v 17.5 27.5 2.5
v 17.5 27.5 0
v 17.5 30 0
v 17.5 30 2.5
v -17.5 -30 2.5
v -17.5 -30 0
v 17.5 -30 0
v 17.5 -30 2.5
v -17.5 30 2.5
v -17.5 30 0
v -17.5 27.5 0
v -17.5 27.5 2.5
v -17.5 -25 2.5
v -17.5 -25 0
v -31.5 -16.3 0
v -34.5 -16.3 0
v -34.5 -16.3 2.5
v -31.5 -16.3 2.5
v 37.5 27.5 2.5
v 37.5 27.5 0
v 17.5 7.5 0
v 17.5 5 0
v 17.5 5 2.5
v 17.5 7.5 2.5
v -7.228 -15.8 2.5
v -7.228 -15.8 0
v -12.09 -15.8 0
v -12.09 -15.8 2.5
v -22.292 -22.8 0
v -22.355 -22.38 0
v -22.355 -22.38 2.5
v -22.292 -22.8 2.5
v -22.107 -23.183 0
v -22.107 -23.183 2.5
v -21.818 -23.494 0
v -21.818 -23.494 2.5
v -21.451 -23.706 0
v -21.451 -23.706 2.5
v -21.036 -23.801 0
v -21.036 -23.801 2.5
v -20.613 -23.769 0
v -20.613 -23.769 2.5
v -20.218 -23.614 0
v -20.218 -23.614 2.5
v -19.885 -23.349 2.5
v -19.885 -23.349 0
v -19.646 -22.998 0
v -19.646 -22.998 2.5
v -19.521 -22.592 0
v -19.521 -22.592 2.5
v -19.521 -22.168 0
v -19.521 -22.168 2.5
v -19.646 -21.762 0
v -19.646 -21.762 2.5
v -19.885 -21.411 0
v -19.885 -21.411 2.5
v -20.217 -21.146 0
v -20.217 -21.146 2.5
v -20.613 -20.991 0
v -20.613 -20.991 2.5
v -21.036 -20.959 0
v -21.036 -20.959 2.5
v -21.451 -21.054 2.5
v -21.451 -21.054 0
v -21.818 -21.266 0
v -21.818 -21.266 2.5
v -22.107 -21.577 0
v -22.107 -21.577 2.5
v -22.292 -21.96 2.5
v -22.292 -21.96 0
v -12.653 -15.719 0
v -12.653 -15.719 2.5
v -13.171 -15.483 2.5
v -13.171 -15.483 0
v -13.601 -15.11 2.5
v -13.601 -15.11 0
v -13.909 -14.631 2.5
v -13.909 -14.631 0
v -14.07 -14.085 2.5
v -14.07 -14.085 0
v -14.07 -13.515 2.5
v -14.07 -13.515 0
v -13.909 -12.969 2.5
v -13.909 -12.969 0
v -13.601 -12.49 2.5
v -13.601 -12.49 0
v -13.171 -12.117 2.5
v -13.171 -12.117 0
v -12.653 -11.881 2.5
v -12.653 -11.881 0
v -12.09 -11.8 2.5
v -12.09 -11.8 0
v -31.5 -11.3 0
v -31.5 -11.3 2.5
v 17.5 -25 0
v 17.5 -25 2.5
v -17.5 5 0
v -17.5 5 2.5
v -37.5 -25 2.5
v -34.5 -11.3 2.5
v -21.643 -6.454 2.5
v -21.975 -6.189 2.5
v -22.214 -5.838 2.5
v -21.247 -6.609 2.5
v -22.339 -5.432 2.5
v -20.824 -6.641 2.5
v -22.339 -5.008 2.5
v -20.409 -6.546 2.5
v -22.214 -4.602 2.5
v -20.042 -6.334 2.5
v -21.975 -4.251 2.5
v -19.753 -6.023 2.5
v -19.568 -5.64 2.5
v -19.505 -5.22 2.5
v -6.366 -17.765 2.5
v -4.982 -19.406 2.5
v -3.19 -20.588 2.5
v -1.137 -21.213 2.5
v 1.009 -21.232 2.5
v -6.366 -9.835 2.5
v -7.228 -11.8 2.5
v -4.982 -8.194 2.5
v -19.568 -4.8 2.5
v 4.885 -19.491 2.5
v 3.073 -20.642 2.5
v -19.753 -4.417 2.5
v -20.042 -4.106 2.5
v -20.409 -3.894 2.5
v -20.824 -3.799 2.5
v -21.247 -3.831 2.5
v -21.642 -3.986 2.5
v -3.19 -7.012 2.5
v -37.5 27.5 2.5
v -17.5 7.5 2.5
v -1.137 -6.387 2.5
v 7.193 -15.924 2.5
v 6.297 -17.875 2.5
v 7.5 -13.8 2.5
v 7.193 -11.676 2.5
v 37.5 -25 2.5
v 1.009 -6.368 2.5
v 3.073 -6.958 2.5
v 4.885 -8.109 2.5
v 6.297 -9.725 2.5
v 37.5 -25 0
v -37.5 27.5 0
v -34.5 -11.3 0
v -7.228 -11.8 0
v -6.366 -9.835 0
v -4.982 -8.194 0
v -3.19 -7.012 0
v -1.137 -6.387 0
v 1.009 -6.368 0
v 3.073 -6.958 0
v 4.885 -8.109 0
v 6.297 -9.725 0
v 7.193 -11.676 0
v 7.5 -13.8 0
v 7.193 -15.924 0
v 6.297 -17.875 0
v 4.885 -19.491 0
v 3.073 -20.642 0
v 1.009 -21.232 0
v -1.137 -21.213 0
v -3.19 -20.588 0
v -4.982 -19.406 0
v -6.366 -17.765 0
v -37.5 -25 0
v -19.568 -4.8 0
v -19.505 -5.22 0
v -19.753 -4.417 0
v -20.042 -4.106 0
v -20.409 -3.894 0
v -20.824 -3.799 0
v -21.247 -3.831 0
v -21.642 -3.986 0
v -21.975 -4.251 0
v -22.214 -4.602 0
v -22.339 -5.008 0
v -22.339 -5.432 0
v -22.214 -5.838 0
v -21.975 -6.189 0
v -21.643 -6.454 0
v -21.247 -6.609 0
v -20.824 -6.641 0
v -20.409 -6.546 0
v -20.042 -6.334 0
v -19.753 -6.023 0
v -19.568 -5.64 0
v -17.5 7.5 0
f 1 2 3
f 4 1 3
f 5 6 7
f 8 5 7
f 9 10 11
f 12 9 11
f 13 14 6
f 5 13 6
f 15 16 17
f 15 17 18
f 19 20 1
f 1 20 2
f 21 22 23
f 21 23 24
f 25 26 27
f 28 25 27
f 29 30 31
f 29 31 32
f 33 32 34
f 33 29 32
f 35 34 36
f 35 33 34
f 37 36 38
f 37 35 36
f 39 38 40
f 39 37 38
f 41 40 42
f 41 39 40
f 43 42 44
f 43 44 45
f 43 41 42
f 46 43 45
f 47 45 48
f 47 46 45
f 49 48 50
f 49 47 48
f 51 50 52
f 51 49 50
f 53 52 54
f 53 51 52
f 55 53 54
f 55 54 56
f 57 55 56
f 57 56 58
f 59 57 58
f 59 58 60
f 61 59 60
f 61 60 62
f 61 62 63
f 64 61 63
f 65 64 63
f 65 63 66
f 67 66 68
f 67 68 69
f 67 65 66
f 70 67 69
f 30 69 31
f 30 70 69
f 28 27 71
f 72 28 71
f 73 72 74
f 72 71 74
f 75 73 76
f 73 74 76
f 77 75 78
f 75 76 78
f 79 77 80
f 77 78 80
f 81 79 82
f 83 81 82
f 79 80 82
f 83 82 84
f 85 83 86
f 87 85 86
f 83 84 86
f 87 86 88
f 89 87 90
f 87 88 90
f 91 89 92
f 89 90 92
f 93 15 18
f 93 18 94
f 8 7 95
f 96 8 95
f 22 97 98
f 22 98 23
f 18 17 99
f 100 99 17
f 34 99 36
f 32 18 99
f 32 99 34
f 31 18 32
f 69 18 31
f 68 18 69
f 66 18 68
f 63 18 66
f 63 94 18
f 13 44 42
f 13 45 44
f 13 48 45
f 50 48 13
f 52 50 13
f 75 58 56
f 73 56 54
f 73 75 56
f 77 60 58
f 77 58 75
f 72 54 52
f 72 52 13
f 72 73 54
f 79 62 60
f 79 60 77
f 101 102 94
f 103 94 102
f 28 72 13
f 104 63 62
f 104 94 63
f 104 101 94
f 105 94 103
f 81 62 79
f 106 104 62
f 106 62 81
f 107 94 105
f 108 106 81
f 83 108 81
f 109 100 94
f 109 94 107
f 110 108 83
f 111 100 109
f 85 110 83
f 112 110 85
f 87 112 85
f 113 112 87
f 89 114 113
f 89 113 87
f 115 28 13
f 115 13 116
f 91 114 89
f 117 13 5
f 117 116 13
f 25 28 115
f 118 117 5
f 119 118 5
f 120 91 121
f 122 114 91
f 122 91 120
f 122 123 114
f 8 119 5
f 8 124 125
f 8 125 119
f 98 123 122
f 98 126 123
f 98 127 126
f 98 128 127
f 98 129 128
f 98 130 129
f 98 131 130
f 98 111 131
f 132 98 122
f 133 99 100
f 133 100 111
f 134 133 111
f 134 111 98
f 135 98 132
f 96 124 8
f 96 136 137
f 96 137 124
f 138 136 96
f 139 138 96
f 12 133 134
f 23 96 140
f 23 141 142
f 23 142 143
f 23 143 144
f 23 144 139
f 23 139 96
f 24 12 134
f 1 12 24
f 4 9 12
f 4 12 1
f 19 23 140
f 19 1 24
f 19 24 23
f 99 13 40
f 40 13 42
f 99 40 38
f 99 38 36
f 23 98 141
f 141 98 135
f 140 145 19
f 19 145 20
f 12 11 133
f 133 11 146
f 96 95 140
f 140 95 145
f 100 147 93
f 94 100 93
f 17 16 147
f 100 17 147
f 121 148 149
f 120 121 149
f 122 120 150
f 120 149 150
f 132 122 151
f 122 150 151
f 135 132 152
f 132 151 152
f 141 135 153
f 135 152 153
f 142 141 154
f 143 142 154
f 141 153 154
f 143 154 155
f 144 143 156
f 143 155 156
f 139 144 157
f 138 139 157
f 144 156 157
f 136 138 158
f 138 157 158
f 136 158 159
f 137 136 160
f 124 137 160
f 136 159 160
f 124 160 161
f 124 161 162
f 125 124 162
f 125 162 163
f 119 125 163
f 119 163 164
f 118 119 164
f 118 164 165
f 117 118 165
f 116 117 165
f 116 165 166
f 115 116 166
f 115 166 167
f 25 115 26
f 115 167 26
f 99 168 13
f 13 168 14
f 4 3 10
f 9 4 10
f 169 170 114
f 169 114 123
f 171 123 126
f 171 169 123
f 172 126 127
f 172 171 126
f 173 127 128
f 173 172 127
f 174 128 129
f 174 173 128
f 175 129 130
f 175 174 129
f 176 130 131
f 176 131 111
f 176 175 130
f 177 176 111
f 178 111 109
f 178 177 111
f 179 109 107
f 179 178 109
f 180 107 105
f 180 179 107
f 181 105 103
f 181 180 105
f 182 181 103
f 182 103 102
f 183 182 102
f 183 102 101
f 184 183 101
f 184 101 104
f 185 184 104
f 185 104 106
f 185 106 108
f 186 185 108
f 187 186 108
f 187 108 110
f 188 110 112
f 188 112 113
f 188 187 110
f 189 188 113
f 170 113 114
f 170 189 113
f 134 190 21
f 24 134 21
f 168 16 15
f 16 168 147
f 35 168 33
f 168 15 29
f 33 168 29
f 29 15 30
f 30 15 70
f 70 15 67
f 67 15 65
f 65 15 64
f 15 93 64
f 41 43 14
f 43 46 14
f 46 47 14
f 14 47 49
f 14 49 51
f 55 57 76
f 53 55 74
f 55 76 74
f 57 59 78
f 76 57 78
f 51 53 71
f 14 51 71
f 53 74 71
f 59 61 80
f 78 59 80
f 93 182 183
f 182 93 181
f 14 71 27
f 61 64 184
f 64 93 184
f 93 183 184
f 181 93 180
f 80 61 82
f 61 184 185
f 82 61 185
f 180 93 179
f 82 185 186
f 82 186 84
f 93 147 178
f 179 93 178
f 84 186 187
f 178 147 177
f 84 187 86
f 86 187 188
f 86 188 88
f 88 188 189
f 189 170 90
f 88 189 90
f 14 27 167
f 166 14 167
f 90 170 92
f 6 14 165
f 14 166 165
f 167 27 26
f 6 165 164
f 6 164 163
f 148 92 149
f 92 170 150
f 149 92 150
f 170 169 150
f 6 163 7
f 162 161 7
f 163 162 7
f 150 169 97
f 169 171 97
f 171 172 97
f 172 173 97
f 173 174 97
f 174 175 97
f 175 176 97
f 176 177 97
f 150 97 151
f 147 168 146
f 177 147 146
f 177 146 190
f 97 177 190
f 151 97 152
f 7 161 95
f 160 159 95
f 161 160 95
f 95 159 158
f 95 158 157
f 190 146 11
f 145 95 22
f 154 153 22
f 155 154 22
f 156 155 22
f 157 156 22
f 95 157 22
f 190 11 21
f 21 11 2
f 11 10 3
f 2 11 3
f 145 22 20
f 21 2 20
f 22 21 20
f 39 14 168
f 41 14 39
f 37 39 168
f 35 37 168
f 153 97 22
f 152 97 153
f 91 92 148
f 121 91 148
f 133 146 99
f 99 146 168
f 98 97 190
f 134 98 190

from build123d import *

# Parameters (mm, degrees)
SKETCH1_R           = 1.425
SKETCH1_W           = 3
SKETCH1_H           = 5
SKETCH1_W_2         = 35
SKETCH1_H_2         = 2.5
BOSS_EXTRUDE1_DEPTH = 2.5


with BuildPart() as part:
    # Sketch1 → Boss-Extrude1 (new body)
    with BuildSketch(Plane.XY):
        Polygon((17.5, 30), (-17.5, 30), (-17.5, 27.5), (-37.5, 27.5), (-37.5, -25), (-17.5, -25), (-17.5, -30), (17.5, -30), (17.5, -25), (37.5, -25), (37.5, 27.5), (17.5, 27.5), align=None)
        with Locations((-20.93, -5.22)):
            Circle(SKETCH1_R, mode=Mode.SUBTRACT)
        with Locations(Location((-20.93, -22.38, 0), (0, 0, 180))):
            Circle(SKETCH1_R, mode=Mode.SUBTRACT)
        with BuildLine():
            Line((-12.09, -11.8), (-7.228416147, -11.8))
            ThreePointArc((-7.228416147, -11.8), (7.5, -13.8), (-7.228416147, -15.8))
            Line((-7.228416147, -15.8), (-12.09, -15.8))
            ThreePointArc((-12.09, -15.8), (-14.09, -13.8), (-12.09, -11.8))
        make_face(mode=Mode.SUBTRACT)
        with Locations((-33, -13.8)):
            Rectangle(SKETCH1_W, SKETCH1_H, mode=Mode.SUBTRACT)
        with Locations((0, 6.25)):
            Rectangle(SKETCH1_W_2, SKETCH1_H_2, mode=Mode.SUBTRACT)
    extrude(amount=BOSS_EXTRUDE1_DEPTH)


solid = part.part
